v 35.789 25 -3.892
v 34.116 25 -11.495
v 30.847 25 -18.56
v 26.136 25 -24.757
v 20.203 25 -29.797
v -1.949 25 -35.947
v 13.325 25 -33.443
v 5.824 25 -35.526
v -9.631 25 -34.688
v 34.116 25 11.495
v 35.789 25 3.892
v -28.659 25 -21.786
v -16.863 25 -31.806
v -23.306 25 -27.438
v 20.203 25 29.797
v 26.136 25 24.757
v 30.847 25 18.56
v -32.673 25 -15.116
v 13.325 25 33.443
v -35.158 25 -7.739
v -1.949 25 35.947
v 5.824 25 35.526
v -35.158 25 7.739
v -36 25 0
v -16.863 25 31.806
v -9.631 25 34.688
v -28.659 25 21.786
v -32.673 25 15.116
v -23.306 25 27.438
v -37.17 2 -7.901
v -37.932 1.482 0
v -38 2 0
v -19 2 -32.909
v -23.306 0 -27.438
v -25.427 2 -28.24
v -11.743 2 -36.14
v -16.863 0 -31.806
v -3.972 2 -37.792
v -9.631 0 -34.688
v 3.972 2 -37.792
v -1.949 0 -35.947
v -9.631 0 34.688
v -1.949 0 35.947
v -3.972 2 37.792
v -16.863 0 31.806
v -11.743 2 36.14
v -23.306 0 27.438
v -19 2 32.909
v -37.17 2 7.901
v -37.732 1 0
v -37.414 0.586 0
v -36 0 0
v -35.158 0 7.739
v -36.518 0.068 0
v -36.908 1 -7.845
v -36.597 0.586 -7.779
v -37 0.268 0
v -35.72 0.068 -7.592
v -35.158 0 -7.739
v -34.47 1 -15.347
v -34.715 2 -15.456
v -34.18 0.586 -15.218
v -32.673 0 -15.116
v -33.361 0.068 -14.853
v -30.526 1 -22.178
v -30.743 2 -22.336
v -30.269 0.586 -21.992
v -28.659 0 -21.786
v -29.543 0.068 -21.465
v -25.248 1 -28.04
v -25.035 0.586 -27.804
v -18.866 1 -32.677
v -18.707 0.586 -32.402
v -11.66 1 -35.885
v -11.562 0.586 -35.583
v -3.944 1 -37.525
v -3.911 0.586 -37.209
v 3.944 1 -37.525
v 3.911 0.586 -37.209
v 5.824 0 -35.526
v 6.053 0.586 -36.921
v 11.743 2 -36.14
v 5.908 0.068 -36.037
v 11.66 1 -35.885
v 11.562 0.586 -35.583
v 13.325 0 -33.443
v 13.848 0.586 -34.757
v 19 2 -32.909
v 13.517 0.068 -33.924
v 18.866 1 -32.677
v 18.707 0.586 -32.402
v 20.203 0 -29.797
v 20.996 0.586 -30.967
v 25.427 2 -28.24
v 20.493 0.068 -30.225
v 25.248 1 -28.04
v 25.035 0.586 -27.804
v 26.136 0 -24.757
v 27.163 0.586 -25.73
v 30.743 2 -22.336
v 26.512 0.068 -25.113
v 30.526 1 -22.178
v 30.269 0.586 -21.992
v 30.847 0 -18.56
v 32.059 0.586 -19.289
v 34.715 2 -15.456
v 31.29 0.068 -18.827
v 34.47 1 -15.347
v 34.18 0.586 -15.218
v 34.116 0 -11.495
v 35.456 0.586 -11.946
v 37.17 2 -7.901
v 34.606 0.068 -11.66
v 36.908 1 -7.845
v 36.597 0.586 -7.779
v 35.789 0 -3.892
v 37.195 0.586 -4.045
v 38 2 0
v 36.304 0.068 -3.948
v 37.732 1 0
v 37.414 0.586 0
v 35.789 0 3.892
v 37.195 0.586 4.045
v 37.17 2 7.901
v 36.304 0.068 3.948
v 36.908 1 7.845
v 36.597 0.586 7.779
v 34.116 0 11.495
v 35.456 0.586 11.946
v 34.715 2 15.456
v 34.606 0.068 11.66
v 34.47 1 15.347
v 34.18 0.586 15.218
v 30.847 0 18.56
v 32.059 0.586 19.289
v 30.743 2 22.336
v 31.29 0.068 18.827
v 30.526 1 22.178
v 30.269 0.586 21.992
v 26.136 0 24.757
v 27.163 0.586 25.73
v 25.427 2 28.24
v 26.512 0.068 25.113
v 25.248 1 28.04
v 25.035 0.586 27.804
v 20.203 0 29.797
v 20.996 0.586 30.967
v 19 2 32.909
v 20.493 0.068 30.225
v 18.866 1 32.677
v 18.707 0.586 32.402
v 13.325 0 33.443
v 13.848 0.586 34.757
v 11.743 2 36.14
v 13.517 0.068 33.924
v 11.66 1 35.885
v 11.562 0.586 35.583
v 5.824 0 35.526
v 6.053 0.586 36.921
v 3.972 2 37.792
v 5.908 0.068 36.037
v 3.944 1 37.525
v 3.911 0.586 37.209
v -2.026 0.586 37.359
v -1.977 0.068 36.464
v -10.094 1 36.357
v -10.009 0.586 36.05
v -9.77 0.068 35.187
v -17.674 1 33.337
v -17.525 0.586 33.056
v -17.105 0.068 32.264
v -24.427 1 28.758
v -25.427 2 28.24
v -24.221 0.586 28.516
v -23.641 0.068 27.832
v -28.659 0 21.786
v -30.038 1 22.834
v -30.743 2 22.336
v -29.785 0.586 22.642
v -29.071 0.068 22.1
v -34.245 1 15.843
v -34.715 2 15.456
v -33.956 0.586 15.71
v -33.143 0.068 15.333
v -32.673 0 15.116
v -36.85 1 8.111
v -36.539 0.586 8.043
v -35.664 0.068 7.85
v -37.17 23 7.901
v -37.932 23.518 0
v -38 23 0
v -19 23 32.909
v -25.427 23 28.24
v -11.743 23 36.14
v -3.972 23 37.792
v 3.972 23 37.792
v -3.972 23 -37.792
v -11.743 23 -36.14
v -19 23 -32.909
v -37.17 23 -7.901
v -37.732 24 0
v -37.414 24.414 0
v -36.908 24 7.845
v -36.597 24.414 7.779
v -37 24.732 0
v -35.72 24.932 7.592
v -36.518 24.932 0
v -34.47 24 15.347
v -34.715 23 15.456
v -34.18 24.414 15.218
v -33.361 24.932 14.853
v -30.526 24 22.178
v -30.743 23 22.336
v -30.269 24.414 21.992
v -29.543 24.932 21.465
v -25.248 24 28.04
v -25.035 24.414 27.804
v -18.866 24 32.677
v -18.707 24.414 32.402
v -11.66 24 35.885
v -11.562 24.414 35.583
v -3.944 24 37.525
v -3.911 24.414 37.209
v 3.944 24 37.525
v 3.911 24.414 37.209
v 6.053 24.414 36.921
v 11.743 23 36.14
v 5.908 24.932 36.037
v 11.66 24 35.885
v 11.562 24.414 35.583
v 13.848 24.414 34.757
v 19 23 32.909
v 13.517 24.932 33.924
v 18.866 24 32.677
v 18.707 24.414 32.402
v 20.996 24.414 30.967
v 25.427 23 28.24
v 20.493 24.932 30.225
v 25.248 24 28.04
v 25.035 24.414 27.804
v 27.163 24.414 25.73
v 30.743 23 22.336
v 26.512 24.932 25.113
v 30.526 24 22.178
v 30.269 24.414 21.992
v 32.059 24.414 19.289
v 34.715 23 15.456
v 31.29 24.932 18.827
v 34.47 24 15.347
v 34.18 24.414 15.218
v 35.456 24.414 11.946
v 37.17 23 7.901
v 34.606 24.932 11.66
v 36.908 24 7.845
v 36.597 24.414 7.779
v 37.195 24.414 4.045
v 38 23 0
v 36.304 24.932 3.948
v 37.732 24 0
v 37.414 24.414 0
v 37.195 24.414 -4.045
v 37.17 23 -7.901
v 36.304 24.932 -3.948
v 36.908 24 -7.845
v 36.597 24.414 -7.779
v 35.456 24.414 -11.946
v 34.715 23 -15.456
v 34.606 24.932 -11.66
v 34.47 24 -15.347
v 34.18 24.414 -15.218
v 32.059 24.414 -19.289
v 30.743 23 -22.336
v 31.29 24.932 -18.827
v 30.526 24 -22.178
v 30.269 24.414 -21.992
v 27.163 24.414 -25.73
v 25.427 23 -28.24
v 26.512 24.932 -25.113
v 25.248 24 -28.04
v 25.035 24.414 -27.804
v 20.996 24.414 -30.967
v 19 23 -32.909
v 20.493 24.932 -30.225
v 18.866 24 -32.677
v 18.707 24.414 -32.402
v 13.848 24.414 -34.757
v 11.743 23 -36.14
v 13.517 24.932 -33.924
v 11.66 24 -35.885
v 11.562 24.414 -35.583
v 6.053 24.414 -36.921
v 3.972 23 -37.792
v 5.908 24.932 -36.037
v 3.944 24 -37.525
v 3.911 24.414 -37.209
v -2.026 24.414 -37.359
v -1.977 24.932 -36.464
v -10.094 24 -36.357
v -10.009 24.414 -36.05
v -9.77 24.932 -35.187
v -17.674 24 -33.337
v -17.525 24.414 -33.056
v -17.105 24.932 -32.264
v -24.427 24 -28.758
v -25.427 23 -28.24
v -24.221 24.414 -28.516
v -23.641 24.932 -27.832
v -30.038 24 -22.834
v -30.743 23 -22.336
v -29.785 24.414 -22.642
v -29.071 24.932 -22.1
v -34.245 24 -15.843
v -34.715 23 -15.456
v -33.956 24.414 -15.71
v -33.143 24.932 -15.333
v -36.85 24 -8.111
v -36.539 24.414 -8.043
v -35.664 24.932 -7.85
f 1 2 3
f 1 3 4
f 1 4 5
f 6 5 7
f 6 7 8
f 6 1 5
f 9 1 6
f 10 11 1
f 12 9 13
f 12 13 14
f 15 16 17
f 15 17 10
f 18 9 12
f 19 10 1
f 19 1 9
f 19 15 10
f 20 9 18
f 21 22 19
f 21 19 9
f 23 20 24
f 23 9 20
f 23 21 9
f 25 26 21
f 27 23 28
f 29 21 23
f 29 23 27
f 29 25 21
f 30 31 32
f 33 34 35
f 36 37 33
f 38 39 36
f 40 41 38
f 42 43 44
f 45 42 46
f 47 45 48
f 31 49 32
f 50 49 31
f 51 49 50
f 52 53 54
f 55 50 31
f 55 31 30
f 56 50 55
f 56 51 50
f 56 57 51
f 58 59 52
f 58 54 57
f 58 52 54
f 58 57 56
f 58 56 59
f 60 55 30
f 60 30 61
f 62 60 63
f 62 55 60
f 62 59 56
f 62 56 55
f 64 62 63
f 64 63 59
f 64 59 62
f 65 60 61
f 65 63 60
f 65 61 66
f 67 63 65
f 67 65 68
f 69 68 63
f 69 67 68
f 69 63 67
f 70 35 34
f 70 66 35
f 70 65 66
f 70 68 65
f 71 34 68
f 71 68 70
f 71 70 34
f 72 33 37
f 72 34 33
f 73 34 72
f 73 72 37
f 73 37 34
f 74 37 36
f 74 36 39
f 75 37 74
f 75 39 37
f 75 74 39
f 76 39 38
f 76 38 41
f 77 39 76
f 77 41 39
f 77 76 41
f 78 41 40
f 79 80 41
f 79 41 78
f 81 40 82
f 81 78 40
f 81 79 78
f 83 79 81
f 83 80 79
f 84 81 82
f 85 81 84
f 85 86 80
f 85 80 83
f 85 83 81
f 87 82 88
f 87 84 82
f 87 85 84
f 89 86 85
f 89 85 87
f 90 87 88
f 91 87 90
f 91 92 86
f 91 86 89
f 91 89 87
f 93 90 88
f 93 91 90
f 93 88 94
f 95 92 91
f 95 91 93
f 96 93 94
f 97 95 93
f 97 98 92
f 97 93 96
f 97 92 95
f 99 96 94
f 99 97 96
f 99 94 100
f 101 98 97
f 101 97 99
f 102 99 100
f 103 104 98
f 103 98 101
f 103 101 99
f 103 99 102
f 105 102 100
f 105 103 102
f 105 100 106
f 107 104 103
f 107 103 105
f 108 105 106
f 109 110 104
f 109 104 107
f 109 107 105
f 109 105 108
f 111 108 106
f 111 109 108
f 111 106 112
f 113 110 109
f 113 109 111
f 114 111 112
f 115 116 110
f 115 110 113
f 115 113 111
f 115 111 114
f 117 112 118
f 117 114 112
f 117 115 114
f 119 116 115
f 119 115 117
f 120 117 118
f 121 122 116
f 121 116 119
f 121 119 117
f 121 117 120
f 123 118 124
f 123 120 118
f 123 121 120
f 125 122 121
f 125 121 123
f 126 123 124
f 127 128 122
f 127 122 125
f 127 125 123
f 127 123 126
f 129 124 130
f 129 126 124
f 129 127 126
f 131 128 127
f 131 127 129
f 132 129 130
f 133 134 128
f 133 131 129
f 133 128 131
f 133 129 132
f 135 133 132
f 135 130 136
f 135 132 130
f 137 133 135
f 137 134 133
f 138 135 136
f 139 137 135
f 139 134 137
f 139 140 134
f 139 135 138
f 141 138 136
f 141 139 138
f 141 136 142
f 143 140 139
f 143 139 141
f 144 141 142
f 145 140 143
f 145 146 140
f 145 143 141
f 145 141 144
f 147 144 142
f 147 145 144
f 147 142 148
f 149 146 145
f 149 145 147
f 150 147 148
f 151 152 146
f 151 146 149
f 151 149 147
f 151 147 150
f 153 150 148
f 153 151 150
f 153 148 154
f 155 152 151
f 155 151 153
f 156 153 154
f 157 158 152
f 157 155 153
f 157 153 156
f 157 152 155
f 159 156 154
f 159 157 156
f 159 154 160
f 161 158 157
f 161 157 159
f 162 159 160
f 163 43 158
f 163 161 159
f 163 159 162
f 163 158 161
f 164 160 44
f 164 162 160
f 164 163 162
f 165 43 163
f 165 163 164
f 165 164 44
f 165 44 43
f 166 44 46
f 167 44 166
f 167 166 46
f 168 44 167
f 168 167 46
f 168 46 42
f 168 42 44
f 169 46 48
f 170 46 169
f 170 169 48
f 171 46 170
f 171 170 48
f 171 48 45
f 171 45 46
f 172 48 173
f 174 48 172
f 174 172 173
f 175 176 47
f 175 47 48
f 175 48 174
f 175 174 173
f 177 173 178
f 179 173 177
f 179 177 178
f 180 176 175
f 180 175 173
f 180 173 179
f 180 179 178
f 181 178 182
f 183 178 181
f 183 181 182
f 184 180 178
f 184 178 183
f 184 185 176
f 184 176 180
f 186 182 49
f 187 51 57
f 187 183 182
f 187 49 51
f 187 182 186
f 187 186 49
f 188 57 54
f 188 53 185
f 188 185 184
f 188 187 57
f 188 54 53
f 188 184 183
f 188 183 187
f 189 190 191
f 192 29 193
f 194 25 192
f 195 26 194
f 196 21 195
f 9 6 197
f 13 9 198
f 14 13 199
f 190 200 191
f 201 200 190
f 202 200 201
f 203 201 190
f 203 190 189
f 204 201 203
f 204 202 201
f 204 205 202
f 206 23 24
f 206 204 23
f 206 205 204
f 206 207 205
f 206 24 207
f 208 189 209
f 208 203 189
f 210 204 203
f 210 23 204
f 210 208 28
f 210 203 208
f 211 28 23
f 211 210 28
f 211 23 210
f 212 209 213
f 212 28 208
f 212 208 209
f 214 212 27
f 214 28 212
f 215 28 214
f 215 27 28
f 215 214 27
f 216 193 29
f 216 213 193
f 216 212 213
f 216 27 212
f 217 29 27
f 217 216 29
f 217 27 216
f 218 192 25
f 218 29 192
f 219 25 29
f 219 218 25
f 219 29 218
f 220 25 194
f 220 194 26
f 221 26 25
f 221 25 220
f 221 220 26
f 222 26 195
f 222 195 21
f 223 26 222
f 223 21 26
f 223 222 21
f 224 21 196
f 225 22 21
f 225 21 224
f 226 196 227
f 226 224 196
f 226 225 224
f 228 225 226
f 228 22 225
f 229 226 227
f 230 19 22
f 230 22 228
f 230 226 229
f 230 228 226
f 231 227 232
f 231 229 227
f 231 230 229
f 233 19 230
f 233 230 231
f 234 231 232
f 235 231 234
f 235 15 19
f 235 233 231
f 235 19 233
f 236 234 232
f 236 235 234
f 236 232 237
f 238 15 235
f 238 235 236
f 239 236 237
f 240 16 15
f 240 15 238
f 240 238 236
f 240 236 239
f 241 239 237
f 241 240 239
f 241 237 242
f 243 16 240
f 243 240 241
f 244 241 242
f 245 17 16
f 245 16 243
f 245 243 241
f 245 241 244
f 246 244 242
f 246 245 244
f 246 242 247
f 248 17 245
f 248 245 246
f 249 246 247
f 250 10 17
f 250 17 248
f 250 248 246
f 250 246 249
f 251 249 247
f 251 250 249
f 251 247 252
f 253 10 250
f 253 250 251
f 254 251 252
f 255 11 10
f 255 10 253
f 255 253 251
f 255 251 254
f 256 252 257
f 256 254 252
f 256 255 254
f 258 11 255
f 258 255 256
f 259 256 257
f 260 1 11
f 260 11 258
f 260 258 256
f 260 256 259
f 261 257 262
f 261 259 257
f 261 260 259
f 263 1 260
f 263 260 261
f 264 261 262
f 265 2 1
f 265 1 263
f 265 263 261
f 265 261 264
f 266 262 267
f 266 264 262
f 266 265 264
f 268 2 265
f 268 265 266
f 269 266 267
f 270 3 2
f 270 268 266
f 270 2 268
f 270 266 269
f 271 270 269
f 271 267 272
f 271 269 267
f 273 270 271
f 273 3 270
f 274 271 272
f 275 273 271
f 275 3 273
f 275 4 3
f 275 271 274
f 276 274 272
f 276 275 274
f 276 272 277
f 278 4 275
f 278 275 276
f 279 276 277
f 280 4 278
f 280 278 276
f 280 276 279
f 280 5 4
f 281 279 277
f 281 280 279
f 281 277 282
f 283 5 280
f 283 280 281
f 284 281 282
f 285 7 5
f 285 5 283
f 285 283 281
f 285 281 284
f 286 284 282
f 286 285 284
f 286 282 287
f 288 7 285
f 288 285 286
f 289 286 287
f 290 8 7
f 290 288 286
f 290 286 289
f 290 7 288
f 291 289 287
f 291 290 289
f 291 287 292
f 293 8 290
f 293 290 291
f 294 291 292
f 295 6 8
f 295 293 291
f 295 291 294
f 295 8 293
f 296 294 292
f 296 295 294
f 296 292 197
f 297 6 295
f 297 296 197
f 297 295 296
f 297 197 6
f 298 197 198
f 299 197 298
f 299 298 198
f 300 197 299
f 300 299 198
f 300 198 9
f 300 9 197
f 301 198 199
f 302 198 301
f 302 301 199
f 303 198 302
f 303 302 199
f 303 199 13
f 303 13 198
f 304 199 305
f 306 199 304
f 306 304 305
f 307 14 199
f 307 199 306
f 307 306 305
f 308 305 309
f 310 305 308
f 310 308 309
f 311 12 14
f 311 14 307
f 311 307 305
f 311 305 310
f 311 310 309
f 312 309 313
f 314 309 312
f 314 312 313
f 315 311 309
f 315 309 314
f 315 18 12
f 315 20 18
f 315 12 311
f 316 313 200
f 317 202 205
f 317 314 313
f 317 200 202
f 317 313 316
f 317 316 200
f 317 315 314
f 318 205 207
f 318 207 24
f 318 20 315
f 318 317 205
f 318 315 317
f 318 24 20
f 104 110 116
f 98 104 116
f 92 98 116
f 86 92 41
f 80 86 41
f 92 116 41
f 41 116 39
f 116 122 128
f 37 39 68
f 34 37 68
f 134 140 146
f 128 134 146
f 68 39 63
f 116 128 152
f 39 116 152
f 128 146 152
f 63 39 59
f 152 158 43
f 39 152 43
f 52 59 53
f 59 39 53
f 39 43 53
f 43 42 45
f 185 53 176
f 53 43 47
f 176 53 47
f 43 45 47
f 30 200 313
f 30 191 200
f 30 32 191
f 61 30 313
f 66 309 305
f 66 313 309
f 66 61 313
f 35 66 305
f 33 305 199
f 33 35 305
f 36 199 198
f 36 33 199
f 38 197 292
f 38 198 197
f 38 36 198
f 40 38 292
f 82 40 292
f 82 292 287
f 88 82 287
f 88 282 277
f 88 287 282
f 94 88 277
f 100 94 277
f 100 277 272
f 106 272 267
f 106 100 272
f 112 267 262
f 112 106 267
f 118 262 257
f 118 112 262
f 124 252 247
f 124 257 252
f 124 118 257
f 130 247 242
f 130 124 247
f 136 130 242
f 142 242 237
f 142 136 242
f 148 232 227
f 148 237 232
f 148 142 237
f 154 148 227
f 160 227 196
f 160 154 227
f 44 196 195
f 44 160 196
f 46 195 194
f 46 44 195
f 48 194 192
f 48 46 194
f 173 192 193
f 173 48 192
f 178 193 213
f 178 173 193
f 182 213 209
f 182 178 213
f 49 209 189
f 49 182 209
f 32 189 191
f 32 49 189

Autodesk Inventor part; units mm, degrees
ref_plane "YZ Plane" through (0, 0, 0) normal (1, 0, 0) x (0, 1, 0)
ref_plane "XZ Plane" through (0, 0, 0) normal (0, 1, 0) x (-1, 0, 0)
ref_plane "XY Plane" through (0, 0, 0) normal (0, 0, 1) x (1, 0, 0)
sketch "Esquisse1" plane through (0, 0, 0) normal (0, 1, 0) x (-1, 0, 0)
  circle A0 centre (0, 0) radius 38
  dimension "d0" = 76
extrude "Extrusion1" add sketch "Esquisse1" along normal blind 25
fillet "Congé1" radius 2 1 edges at (38, 25, 0)
fillet "Congé2" radius 2 1 edges at (38, 0, 0)
properties part number "palet"
